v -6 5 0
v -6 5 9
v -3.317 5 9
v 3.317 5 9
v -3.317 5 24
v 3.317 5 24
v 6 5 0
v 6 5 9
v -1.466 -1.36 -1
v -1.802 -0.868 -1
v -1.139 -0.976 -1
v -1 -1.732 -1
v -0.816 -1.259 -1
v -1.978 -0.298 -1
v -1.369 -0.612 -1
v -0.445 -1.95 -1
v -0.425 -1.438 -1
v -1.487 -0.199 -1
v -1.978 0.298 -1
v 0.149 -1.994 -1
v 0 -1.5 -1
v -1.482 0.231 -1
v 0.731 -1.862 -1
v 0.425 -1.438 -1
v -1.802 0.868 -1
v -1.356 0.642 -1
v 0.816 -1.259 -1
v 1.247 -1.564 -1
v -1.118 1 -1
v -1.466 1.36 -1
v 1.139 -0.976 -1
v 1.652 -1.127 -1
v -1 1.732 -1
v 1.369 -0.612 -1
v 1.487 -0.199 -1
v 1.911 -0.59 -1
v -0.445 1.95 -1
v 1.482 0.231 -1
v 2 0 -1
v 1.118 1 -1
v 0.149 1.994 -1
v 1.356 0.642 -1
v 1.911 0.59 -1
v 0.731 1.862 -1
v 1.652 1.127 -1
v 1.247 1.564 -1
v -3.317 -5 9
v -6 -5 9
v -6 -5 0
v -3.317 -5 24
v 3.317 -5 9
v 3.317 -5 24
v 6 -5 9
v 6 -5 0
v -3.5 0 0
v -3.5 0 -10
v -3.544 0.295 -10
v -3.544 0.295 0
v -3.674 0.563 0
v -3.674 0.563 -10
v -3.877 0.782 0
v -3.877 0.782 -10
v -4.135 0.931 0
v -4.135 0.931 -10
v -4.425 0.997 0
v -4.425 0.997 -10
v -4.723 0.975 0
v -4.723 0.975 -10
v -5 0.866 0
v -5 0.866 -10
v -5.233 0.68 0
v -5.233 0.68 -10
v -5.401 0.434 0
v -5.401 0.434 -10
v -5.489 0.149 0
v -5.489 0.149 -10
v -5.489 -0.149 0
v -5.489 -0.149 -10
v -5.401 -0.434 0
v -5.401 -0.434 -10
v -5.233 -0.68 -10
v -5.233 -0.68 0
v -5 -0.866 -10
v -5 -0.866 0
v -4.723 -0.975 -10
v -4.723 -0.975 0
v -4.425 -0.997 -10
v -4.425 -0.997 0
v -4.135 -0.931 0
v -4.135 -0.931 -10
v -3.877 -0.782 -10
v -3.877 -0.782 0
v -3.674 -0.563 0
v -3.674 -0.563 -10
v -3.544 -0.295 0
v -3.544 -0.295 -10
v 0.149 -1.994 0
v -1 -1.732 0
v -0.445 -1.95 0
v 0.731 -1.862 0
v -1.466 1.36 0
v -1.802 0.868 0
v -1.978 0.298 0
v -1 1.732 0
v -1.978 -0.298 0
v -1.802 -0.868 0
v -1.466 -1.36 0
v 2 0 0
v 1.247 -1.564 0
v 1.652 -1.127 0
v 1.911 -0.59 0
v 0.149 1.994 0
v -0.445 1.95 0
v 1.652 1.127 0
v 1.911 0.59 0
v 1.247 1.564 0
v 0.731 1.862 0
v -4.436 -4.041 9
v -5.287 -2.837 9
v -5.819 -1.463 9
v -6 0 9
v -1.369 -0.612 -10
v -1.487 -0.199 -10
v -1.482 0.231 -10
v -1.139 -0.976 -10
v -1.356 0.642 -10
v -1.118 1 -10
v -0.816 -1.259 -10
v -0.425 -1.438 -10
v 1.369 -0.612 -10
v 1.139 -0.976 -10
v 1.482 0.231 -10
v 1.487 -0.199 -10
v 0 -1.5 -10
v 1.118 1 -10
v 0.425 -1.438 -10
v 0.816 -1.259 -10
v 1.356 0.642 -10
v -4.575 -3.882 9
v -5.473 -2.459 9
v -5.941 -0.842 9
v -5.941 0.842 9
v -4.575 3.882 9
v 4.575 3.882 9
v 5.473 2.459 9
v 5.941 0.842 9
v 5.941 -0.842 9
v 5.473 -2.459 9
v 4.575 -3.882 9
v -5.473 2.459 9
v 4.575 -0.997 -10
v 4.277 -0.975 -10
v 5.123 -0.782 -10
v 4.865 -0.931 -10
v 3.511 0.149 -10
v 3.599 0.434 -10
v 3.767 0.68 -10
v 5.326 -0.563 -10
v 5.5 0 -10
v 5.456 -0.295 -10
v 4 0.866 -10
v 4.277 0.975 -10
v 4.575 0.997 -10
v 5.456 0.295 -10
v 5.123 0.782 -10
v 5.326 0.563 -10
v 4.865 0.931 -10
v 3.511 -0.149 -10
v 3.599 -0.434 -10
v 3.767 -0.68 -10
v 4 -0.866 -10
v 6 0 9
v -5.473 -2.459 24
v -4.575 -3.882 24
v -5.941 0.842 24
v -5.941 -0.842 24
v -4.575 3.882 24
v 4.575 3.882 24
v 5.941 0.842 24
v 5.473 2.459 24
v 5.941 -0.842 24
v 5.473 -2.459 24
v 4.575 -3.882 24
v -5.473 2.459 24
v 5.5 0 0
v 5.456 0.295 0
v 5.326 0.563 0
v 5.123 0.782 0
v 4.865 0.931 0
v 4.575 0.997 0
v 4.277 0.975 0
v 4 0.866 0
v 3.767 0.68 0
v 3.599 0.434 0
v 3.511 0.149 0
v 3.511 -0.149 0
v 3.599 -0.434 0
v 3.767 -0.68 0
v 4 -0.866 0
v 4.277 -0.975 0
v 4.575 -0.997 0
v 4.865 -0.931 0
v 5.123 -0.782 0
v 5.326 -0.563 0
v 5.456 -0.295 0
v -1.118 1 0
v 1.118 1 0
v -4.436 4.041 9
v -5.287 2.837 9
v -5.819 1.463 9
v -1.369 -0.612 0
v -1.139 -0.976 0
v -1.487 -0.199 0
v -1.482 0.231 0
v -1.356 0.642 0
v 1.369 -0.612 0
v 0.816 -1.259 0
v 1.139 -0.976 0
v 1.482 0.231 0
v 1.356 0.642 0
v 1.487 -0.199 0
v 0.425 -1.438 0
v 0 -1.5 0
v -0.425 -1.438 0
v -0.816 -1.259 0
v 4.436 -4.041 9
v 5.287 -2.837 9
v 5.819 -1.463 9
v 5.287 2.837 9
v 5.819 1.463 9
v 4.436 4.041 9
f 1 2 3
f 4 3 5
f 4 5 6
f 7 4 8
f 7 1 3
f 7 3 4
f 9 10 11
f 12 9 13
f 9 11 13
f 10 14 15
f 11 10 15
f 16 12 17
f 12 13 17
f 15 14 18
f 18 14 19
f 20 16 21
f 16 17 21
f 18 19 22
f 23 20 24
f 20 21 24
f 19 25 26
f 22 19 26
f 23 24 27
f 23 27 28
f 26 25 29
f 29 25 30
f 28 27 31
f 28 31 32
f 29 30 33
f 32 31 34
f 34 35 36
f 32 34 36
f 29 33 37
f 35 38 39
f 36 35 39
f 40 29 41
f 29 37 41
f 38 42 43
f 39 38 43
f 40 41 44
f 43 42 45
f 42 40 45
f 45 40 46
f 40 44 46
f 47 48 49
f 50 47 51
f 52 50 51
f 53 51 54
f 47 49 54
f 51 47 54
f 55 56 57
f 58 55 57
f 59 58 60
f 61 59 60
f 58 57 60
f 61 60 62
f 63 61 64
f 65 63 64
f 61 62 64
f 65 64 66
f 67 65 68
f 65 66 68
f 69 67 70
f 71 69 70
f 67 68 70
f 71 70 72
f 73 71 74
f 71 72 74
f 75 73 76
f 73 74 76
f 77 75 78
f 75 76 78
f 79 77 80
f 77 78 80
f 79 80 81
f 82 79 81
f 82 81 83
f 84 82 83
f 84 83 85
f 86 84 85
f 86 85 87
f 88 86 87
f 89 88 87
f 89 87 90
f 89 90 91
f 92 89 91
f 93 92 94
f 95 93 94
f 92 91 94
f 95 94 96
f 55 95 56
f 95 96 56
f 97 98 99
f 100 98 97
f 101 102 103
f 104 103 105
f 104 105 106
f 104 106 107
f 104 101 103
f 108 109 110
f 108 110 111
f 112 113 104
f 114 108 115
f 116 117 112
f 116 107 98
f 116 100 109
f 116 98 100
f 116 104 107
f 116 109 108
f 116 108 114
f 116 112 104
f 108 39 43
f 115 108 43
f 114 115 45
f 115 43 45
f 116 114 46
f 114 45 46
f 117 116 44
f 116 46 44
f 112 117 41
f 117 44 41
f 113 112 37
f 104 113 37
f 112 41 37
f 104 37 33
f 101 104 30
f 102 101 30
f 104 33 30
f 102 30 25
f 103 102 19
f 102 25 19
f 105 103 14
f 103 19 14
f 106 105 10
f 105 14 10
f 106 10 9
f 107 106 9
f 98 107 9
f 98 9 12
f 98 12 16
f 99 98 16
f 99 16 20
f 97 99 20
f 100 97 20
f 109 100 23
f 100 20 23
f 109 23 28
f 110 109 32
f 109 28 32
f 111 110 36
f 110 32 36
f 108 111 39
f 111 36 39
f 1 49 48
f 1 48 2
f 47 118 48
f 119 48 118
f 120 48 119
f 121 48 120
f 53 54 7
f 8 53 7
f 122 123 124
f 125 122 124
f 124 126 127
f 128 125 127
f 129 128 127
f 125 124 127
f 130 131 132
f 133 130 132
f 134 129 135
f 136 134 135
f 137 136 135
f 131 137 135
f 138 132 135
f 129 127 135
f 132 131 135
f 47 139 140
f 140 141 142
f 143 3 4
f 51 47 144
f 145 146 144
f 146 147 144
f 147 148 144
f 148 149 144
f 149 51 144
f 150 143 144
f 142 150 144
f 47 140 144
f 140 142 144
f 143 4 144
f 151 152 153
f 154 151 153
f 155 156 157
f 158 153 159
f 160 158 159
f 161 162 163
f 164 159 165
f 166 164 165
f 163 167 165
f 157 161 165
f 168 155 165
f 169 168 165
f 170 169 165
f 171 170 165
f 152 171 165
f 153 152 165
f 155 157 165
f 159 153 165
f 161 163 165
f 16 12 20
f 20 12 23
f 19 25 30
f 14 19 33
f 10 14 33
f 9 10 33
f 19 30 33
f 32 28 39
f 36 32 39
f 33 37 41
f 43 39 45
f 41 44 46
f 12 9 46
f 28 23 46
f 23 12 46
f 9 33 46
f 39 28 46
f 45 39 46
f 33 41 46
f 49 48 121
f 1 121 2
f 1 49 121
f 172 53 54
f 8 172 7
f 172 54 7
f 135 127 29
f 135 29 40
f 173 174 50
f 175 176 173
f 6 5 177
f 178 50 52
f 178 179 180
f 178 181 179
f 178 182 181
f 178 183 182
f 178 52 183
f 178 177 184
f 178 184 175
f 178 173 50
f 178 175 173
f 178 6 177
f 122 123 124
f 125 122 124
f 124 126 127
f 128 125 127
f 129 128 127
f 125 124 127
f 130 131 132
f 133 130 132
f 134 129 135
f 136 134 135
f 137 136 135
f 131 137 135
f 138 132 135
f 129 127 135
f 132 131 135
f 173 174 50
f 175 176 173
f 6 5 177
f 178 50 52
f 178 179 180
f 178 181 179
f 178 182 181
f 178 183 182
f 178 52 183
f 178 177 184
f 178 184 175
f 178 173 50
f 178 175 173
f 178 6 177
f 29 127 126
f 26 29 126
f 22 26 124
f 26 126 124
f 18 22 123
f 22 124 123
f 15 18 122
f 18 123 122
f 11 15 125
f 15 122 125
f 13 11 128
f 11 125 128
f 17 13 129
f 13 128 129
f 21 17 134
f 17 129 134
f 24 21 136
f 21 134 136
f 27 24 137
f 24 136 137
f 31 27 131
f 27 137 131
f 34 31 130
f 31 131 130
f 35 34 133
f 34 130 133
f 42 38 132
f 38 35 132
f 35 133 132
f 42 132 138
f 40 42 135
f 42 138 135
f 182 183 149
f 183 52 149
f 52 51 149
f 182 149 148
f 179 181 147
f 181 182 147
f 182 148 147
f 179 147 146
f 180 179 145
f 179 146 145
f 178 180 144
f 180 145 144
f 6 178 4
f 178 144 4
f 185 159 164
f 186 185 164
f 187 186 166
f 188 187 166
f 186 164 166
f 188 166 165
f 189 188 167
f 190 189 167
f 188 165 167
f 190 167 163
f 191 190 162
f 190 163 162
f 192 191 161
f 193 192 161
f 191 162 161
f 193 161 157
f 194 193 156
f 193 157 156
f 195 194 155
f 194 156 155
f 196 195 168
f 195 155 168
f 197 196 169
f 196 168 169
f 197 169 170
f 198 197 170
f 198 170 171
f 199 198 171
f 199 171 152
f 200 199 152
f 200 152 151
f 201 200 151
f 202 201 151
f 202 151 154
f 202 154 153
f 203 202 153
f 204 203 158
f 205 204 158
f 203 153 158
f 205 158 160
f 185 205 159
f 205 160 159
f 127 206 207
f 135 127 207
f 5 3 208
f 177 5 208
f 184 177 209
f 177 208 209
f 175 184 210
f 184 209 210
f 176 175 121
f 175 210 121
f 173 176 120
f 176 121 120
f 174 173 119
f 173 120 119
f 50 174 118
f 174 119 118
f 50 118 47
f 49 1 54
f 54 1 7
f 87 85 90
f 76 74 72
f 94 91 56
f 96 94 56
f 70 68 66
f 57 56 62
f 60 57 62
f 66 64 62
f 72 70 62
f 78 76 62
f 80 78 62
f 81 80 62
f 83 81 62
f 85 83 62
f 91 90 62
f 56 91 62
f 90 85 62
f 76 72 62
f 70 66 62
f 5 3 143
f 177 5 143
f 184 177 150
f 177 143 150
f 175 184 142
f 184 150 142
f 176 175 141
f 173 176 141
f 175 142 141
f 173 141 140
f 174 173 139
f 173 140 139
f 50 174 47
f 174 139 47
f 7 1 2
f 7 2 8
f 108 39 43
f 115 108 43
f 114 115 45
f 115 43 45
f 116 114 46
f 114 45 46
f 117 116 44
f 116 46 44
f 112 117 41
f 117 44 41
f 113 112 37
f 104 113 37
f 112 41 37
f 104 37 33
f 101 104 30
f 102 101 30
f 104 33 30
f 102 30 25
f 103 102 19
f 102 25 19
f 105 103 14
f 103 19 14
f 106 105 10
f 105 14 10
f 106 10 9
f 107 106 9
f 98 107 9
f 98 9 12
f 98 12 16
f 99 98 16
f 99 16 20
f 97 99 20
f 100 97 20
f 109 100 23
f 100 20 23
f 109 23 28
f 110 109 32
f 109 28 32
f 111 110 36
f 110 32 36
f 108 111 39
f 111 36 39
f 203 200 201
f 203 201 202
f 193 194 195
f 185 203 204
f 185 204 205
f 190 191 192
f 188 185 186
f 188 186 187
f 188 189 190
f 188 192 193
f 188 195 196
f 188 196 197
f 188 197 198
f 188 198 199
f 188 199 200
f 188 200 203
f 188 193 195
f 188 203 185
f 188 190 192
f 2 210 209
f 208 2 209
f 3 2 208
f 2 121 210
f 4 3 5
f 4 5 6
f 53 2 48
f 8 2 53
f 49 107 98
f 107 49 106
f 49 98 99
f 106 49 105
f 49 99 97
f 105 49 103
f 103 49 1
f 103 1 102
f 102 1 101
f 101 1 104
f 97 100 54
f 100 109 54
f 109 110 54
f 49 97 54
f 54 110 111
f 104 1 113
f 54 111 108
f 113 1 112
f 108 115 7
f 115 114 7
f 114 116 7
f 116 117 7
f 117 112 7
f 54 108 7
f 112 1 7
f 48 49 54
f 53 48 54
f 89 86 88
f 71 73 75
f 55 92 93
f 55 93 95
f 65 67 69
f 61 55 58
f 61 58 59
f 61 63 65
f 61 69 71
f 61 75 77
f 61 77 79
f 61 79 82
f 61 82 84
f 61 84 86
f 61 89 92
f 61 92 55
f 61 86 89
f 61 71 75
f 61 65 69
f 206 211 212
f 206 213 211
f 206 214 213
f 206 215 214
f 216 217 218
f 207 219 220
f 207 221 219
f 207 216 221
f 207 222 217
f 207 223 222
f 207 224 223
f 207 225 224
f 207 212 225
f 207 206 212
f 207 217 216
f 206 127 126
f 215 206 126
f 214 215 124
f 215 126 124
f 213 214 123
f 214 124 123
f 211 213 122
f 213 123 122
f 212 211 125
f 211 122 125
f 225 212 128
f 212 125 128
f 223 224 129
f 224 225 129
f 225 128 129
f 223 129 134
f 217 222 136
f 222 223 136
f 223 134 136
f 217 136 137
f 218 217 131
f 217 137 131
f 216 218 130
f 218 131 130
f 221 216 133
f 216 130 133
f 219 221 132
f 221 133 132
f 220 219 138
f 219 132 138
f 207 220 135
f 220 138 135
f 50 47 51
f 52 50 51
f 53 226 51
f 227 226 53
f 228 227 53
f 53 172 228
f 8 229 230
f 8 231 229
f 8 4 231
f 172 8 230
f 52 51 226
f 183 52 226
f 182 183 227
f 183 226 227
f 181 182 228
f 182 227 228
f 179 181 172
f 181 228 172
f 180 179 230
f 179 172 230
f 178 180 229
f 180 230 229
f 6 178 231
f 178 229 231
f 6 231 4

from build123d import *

# Parameters (mm, degrees)
CYLINDER032_R     = 1
CYLINDER032_DEPTH = 10
CYLINDER033_R     = 1
CYLINDER033_DEPTH = 10
BOX_W             = 12
BOX_H             = 10
BOX_DEPTH         = 9
CYLINDER034_R     = 2
CYLINDER034_DEPTH = 1
BOX004_W          = 10
BOX004_H          = 10
BOX004_DEPTH      = 12
CYLINDER031_R     = 1.5
CYLINDER031_DEPTH = 10
CYLINDER_R        = 6
CYLINDER_DEPTH    = 15
BOX001_W          = 16
BOX001_H          = 10
BOX001_DEPTH      = 27
CYLINDER036_R     = 2
CYLINDER036_DEPTH = 1
BOX003_W          = 16
BOX003_H          = 10
BOX003_DEPTH      = 27
CYLINDER037_R     = 6
CYLINDER037_DEPTH = 15
BOX005_W          = 10
BOX005_H          = 10
BOX005_DEPTH      = 12
CYLINDER038_R     = 1.5
CYLINDER038_DEPTH = 10
BOX002_W          = 12
BOX002_H          = 10
BOX002_DEPTH      = 9


with BuildPart() as cylinder032:
    # Cylinder032 → Cylinder032 (new body)
    with BuildSketch(Plane(origin=(4.5, 0, -10), x_dir=(1, 0, 0), z_dir=(0, 0, 1))):
        Circle(CYLINDER032_R)
    extrude(amount=CYLINDER032_DEPTH)


with BuildPart() as cylinder033:
    # Cylinder033 → Cylinder033 (new body)
    with BuildSketch(Plane(origin=(-4.5, 0, -10), x_dir=(1, 0, 0), z_dir=(0, 0, 1))):
        Circle(CYLINDER033_R)
    extrude(amount=CYLINDER033_DEPTH)


with BuildPart() as gearbox:
    # Box → Box (new body)
    with BuildSketch(Plane(origin=(-6, -5, 0), x_dir=(1, 0, 0), z_dir=(0, 0, 1))):
        with Locations((6, 5)):
            Rectangle(BOX_W, BOX_H)
    extrude(amount=BOX_DEPTH)


with BuildPart() as boss:
    # Cylinder034 → Cylinder034 (new body)
    with BuildSketch(Plane.XY.offset(-1)):
        Circle(CYLINDER034_R)
    extrude(amount=CYLINDER034_DEPTH)


with BuildPart() as cube:
    # Box004 → Box004 (new body)
    with BuildSketch(Plane(origin=(-5, 1, -11), x_dir=(1, 0, 0), z_dir=(0, 0, 1))):
        with Locations((5, 5)):
            Rectangle(BOX004_W, BOX004_H)
    extrude(amount=BOX004_DEPTH)


with BuildPart() as shaft:
    # Cylinder031 → Cylinder031 (new body)
    with BuildSketch(Plane.XY.offset(-10)):
        Circle(CYLINDER031_R)
    extrude(amount=CYLINDER031_DEPTH)

    # Cut: cut Cube
    add(cube.part, mode=Mode.SUBTRACT)


with BuildPart() as cylinder:
    # Cylinder → Cylinder (new body)
    with BuildSketch(Plane.XY.offset(9)):
        Circle(CYLINDER_R)
    extrude(amount=CYLINDER_DEPTH)


with BuildPart() as motor:
    # Box001 → Box001 (new body)
    with BuildSketch(Plane(origin=(-8, -5, 0), x_dir=(1, 0, 0), z_dir=(0, 0, 1))):
        with Locations((8, 5)):
            Rectangle(BOX001_W, BOX001_H)
    extrude(amount=BOX001_DEPTH)

    # Common: intersect Cylinder
    add(cylinder.part, mode=Mode.INTERSECT)


with BuildPart() as boss001:
    # Cylinder036 → Cylinder036 (new body)
    with BuildSketch(Plane.XY.offset(-1)):
        Circle(CYLINDER036_R)
    extrude(amount=CYLINDER036_DEPTH)


with BuildPart() as gearbox003:
    # Box003 → Box003 (new body)
    with BuildSketch(Plane(origin=(-8, -5, 0), x_dir=(1, 0, 0), z_dir=(0, 0, 1))):
        with Locations((8, 5)):
            Rectangle(BOX003_W, BOX003_H)
    extrude(amount=BOX003_DEPTH)


with BuildPart() as motor001:
    # Cylinder037 → Cylinder037 (new body)
    with BuildSketch(Plane.XY.offset(9)):
        Circle(CYLINDER037_R)
    extrude(amount=CYLINDER037_DEPTH)

    # Common001: intersect gearbox003
    add(gearbox003.part, mode=Mode.INTERSECT)


with BuildPart() as cube001:
    # Box005 → Box005 (new body)
    with BuildSketch(Plane(origin=(-5, 1, -11), x_dir=(1, 0, 0), z_dir=(0, 0, 1))):
        with Locations((5, 5)):
            Rectangle(BOX005_W, BOX005_H)
    extrude(amount=BOX005_DEPTH)


with BuildPart() as shaft001:
    # Cylinder038 → Cylinder038 (new body)
    with BuildSketch(Plane.XY.offset(-10)):
        Circle(CYLINDER038_R)
    extrude(amount=CYLINDER038_DEPTH)

    # Cut001: cut Cube001
    add(cube001.part, mode=Mode.SUBTRACT)


with BuildPart() as motor_assembled:
    # Box002 → Box002 (new body)
    with BuildSketch(Plane(origin=(-6, -5, 0), x_dir=(1, 0, 0), z_dir=(0, 0, 1))):
        with Locations((6, 5)):
            Rectangle(BOX002_W, BOX002_H)
    extrude(amount=BOX002_DEPTH)

    # Fusion: union boss001, motor001, shaft001
    add(boss001.part)
    add(motor001.part)
    add(shaft001.part)


solid = Compound([cylinder032.part, cylinder033.part, gearbox.part, boss.part, shaft.part, motor.part, motor_assembled.part])
